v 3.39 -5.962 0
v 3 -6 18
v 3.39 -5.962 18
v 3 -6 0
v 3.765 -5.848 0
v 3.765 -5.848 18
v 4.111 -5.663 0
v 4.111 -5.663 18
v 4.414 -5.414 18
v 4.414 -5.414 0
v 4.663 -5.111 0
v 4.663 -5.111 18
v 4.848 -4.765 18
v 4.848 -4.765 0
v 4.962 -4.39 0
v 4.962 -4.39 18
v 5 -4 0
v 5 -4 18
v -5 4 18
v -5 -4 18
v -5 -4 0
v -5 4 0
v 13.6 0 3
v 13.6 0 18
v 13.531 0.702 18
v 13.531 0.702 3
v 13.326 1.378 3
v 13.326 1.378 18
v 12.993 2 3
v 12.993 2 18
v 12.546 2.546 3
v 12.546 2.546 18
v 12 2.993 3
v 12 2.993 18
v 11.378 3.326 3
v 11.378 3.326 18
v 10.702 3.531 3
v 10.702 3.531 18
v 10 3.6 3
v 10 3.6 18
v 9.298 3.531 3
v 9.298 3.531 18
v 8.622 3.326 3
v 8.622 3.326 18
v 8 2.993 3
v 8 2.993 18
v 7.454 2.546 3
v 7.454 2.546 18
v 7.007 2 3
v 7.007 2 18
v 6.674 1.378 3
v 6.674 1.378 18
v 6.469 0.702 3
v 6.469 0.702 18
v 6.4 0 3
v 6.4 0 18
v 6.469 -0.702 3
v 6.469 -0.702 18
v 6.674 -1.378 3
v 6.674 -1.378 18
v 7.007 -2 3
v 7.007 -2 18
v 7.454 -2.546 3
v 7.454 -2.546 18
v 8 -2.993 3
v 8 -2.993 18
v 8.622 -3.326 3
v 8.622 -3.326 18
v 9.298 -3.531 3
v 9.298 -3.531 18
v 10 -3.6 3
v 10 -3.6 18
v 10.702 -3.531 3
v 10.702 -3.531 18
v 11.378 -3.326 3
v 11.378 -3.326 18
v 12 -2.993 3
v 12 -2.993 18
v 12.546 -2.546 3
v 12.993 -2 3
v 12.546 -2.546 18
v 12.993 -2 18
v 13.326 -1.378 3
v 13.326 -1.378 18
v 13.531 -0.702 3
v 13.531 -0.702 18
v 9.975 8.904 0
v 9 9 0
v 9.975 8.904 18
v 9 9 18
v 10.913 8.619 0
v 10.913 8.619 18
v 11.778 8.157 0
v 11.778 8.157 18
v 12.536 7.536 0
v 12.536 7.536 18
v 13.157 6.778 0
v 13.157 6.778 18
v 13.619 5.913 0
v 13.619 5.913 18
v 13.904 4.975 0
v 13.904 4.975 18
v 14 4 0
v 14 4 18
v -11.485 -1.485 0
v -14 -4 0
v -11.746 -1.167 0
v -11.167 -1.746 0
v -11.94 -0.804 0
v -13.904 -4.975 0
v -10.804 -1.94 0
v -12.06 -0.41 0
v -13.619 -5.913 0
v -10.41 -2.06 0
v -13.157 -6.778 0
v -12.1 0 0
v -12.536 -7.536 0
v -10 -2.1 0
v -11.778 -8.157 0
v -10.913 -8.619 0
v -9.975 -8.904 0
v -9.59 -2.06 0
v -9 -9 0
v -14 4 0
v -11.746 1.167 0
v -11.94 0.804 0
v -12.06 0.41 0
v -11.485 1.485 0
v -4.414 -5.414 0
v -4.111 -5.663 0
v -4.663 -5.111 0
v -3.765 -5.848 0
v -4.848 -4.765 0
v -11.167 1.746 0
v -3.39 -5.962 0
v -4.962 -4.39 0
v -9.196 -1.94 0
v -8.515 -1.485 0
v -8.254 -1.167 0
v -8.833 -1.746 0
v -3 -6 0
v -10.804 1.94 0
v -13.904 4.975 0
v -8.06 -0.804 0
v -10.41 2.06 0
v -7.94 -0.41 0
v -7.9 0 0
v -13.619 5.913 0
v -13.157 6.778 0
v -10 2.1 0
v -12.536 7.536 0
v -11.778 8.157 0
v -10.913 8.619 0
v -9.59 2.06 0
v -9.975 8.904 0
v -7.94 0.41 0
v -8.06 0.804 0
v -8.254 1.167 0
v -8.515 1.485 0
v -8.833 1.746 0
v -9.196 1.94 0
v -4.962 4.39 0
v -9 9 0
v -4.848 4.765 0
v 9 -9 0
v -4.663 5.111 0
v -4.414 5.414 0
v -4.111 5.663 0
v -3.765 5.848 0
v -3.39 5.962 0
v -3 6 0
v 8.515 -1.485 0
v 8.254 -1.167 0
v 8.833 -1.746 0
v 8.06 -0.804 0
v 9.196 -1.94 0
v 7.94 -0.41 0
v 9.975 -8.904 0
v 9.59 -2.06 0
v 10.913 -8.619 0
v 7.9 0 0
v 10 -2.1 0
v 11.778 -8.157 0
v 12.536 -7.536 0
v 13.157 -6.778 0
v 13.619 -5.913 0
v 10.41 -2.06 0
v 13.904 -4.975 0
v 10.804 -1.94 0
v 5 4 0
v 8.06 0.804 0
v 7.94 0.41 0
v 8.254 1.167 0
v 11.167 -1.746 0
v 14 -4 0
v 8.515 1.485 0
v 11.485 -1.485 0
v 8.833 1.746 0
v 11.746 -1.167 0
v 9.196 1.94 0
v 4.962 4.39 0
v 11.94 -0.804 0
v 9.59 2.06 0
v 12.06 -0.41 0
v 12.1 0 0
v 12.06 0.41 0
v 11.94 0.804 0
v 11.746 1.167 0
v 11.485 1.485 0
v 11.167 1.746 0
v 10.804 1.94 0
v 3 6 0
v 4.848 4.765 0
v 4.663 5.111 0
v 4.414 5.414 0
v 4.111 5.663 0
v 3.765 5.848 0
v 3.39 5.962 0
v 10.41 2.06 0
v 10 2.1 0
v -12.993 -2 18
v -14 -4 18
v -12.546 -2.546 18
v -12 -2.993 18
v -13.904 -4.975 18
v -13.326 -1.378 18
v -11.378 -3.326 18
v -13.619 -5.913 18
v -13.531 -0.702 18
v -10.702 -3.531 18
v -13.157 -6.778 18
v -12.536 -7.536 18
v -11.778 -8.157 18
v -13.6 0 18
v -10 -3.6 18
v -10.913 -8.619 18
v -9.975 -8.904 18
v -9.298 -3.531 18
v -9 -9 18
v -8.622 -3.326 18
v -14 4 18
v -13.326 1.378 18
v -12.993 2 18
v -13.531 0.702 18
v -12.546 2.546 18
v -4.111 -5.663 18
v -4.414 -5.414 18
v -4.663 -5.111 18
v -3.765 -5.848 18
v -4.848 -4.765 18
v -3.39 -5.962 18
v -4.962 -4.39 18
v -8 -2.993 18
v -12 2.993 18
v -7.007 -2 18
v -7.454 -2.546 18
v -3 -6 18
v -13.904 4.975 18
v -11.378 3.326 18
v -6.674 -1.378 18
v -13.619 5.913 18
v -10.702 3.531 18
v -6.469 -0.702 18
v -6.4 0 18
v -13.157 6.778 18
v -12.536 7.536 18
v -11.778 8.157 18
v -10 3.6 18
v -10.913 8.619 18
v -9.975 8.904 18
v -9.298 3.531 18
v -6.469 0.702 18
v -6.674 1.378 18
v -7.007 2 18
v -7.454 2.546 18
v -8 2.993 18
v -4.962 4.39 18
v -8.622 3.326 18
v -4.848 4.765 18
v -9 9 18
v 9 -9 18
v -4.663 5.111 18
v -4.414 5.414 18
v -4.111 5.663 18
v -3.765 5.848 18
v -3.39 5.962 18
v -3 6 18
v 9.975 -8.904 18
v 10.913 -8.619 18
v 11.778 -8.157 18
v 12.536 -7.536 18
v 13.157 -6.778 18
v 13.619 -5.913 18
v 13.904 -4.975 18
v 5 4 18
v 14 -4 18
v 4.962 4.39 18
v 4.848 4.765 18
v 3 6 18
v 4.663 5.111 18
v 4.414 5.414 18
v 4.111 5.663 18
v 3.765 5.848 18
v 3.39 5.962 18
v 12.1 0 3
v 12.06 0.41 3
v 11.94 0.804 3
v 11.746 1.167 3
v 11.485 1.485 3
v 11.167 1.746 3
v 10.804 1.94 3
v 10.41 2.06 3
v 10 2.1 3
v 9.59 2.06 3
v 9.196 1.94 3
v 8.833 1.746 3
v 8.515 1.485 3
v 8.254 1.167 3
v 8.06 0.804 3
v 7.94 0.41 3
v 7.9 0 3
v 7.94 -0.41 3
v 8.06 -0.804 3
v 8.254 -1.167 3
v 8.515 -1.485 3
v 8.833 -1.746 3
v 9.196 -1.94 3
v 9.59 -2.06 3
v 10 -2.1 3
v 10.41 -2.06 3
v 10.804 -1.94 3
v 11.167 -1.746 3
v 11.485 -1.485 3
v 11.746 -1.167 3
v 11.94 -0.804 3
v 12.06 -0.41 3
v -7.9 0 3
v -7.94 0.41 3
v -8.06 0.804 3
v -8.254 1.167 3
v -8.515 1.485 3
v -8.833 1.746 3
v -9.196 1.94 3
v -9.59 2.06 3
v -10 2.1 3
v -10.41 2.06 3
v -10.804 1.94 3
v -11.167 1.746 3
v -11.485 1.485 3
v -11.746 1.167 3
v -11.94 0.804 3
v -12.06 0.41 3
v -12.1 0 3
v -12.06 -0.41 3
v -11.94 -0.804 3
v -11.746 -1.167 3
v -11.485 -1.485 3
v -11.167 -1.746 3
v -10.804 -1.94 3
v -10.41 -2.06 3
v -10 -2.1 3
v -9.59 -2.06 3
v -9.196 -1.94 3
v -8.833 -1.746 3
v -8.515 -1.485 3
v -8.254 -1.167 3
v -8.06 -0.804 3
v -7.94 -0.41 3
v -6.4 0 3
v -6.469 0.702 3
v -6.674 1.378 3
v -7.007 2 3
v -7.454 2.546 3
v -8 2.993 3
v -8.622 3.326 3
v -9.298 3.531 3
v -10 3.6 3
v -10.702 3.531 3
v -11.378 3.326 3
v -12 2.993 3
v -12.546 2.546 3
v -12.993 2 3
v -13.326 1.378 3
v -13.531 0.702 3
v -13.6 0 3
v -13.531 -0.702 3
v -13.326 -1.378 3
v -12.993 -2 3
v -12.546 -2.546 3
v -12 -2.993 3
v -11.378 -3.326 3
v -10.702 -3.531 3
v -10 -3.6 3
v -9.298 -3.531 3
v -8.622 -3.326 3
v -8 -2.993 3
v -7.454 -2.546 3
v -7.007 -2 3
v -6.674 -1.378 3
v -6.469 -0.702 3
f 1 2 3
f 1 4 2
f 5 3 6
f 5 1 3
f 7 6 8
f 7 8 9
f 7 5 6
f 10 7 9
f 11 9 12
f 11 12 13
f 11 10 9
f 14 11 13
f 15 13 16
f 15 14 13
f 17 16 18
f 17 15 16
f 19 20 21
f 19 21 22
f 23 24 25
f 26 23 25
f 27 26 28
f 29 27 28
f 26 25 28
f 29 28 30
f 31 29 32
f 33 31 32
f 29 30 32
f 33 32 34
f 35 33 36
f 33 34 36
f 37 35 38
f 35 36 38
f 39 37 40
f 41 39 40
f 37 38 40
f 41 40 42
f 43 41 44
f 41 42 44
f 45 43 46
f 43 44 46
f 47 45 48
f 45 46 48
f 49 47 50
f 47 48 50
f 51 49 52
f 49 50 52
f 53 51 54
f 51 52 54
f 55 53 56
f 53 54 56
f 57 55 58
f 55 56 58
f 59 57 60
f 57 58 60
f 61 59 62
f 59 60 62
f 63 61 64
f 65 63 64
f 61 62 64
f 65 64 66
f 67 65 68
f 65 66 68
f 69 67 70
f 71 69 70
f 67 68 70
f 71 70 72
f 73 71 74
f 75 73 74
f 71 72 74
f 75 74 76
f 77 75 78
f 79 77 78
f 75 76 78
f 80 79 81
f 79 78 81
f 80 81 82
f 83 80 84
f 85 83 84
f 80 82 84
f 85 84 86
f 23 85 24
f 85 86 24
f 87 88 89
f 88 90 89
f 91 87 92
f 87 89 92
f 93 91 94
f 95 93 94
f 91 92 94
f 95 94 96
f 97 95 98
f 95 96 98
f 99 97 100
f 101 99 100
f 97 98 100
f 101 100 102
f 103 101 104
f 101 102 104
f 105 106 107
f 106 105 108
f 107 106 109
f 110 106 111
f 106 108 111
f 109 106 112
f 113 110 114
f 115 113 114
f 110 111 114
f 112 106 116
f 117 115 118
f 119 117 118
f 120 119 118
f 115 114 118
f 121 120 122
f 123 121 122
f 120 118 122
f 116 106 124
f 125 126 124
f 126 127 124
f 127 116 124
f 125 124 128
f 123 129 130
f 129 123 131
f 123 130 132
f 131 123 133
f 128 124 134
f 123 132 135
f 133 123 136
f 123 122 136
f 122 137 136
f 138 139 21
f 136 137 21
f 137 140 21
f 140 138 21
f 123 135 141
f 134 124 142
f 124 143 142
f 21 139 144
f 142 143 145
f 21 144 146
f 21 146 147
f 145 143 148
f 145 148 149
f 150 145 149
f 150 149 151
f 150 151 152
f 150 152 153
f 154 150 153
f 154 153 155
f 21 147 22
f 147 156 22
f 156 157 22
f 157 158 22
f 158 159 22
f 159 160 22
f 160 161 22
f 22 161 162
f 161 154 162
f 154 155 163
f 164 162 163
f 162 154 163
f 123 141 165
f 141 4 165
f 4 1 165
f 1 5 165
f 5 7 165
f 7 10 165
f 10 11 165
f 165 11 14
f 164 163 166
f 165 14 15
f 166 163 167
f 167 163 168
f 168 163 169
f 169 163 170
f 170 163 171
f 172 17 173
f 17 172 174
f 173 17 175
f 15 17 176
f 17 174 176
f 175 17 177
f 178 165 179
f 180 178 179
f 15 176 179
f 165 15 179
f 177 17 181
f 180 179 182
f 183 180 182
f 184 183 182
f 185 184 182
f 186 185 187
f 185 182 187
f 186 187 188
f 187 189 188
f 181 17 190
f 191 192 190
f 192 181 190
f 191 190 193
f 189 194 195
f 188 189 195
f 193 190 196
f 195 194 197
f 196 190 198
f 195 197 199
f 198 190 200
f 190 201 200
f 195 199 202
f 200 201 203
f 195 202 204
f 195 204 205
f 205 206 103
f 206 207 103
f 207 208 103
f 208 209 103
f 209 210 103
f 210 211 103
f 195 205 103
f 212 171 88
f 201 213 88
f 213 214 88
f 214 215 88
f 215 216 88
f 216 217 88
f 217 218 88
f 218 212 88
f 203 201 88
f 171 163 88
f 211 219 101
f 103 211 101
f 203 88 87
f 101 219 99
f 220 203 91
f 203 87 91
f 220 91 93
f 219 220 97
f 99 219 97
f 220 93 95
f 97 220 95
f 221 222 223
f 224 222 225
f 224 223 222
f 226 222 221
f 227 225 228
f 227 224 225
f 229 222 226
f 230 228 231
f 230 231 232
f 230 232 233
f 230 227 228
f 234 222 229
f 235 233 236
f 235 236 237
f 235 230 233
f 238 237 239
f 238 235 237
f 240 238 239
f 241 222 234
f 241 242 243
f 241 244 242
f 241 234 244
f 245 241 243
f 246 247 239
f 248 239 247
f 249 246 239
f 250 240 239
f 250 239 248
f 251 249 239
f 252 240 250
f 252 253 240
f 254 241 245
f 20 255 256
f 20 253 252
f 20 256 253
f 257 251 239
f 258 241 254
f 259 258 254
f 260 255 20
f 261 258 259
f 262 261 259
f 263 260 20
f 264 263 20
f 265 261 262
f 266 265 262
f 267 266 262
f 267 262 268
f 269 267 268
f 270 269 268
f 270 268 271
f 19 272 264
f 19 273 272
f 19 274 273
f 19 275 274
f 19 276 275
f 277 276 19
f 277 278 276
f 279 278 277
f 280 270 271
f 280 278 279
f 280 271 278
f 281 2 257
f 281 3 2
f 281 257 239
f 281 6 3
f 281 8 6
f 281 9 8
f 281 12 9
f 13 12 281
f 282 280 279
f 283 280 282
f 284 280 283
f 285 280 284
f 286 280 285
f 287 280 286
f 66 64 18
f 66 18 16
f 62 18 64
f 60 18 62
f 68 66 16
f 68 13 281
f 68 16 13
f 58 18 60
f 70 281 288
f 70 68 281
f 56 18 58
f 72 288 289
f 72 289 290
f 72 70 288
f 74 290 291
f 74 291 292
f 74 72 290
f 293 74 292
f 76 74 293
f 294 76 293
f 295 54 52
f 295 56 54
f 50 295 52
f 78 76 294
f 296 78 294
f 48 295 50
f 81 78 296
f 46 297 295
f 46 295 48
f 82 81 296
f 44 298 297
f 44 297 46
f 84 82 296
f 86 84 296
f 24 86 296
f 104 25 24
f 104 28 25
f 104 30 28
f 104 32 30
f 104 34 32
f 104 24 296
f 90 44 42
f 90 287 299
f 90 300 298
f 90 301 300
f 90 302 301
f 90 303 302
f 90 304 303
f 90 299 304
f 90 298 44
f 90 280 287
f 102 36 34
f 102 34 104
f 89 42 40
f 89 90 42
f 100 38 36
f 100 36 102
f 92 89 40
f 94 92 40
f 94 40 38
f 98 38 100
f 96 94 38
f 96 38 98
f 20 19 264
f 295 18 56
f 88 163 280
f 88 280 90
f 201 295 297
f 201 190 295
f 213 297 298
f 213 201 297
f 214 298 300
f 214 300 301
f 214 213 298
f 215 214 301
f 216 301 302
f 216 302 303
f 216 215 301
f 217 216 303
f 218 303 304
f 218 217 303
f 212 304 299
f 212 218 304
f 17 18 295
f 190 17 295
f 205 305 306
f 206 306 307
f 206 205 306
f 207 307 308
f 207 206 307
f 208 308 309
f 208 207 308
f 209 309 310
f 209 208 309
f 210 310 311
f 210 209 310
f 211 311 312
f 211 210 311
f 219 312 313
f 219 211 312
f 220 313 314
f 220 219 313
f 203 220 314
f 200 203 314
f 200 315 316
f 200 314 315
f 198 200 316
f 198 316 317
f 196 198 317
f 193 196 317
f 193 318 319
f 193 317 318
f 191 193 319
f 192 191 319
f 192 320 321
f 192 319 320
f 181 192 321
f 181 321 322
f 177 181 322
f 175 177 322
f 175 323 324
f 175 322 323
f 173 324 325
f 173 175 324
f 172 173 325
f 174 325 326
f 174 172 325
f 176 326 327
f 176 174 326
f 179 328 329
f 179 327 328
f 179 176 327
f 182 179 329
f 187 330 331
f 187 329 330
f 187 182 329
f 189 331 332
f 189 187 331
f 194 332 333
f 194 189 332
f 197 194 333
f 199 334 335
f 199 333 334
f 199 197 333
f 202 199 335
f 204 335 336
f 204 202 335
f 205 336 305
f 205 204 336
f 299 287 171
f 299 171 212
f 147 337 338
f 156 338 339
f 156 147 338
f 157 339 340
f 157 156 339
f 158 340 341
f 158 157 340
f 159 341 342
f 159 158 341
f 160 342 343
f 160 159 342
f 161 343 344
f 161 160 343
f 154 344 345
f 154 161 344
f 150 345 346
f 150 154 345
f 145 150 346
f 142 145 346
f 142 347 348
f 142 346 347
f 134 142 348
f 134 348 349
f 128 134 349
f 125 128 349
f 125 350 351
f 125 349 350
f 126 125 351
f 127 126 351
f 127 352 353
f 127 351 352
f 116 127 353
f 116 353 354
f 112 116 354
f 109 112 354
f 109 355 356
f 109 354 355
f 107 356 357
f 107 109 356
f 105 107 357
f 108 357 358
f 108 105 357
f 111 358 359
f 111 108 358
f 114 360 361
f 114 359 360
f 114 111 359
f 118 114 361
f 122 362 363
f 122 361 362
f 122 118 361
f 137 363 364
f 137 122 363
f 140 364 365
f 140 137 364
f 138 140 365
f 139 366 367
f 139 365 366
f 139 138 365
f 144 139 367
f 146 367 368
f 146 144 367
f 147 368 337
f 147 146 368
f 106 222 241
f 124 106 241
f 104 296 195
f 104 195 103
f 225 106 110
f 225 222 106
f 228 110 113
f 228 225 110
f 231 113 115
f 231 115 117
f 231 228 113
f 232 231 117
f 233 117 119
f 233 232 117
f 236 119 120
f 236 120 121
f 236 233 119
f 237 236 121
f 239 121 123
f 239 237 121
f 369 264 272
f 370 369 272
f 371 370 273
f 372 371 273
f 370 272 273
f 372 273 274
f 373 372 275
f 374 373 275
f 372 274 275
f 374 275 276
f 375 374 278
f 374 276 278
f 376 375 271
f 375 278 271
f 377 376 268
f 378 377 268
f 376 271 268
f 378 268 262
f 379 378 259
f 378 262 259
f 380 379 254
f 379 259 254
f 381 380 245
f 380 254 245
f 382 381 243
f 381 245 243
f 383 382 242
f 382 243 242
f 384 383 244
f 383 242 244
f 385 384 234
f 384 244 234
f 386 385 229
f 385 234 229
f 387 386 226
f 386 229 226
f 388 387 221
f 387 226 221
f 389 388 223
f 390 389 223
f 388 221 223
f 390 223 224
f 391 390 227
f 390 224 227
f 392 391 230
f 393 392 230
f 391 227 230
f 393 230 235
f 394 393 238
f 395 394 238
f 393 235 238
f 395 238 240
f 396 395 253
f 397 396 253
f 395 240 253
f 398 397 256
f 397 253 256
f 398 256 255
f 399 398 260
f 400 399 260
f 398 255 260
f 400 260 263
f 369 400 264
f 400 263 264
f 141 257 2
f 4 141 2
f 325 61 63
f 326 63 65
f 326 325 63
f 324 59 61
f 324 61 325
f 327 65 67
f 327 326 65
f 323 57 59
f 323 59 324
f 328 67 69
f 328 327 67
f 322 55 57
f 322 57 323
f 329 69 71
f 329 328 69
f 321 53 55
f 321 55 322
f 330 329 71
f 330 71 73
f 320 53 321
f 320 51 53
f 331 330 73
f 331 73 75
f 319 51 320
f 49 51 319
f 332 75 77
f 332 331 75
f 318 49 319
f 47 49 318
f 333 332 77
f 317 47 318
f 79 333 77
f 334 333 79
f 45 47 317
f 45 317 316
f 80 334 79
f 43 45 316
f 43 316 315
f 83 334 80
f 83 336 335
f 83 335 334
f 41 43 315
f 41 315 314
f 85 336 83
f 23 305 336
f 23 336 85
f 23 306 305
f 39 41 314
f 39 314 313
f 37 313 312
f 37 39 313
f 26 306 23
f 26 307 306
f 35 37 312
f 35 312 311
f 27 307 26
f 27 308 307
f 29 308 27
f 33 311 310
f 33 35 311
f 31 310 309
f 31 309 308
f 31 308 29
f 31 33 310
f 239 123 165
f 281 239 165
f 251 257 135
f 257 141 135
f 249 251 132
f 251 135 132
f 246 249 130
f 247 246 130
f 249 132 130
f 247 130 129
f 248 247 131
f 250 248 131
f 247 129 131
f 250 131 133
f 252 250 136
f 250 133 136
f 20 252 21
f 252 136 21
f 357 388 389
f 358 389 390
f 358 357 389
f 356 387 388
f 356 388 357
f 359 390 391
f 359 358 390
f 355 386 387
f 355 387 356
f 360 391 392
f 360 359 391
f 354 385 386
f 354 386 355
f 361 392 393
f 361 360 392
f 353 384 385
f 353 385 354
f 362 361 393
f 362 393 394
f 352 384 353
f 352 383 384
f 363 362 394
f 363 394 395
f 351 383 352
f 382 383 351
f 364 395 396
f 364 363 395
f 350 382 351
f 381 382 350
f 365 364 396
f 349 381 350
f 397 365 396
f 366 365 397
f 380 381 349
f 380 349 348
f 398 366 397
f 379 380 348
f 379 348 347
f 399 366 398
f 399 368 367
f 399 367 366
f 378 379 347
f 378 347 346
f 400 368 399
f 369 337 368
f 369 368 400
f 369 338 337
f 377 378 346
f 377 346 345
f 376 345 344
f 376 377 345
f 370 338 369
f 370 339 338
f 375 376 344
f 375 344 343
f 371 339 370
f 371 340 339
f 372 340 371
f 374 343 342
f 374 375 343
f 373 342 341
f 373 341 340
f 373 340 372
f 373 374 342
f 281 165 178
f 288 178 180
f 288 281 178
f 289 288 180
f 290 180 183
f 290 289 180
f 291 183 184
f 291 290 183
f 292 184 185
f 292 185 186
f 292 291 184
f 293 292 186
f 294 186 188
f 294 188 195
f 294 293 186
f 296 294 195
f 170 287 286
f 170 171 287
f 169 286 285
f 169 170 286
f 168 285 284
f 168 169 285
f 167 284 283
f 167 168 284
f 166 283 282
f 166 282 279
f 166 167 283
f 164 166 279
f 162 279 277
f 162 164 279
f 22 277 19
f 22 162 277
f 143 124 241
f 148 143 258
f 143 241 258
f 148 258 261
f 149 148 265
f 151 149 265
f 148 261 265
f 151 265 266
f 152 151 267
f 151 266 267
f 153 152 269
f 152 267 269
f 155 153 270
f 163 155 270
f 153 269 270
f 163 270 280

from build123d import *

# Parameters (mm, degrees)
SKETCH_1_W          = 28
SKETCH_1_H          = 18
SKETCH_1_R          = 2.1
EXTRUDE_1_DEPTH     = 18
SKETCH_2_R          = 3.6
CUT_EXTRUDE_1_DEPTH = 15
SKETCH_3_W          = 10
SKETCH_3_H          = 12
CUT_EXTRUDE_2_DEPTH = 25
FILLET_1_R          = 2
FILLET_2_R          = 5


with BuildPart() as part:
    # 草图1 → 凸台-拉伸1 (new body)
    with BuildSketch(Plane.XY):
        Rectangle(SKETCH_1_W, SKETCH_1_H)
        with Locations((-10, 0)):
            Circle(SKETCH_1_R, mode=Mode.SUBTRACT)
        with Locations((10, 0)):
            Circle(SKETCH_1_R, mode=Mode.SUBTRACT)
    extrude(amount=EXTRUDE_1_DEPTH)

    # 草图2 → 切除-拉伸1 (cut)
    with BuildSketch(Plane.XY.offset(18)):
        with Locations((-10, 0)):
            Circle(SKETCH_2_R)
        with Locations((10, 0)):
            Circle(SKETCH_2_R)
    extrude(amount=-CUT_EXTRUDE_1_DEPTH, mode=Mode.SUBTRACT)

    # 草图3 → 切除-拉伸2 (cut)
    with BuildSketch(Plane.XY.offset(18)):
        Rectangle(SKETCH_3_W, SKETCH_3_H)
    extrude(amount=-CUT_EXTRUDE_2_DEPTH, mode=Mode.SUBTRACT)

    # 圆角1
    fillet_1_edges = [part.edges().sort_by_distance(p)[0] for p in [
        (5, 6, 9),
        (5, -6, 9),
        (-5, -6, 9),
        (-5, 6, 9),
    ]]
    fillet(fillet_1_edges, radius=FILLET_1_R)

    # 圆角2
    fillet_2_edges = [part.edges().sort_by_distance(p)[0] for p in [
        (14, -9, 9),
        (-14, -9, 9),
        (-14, 9, 9),
        (14, 9, 9),
    ]]
    fillet(fillet_2_edges, radius=FILLET_2_R)


solid = part.part
